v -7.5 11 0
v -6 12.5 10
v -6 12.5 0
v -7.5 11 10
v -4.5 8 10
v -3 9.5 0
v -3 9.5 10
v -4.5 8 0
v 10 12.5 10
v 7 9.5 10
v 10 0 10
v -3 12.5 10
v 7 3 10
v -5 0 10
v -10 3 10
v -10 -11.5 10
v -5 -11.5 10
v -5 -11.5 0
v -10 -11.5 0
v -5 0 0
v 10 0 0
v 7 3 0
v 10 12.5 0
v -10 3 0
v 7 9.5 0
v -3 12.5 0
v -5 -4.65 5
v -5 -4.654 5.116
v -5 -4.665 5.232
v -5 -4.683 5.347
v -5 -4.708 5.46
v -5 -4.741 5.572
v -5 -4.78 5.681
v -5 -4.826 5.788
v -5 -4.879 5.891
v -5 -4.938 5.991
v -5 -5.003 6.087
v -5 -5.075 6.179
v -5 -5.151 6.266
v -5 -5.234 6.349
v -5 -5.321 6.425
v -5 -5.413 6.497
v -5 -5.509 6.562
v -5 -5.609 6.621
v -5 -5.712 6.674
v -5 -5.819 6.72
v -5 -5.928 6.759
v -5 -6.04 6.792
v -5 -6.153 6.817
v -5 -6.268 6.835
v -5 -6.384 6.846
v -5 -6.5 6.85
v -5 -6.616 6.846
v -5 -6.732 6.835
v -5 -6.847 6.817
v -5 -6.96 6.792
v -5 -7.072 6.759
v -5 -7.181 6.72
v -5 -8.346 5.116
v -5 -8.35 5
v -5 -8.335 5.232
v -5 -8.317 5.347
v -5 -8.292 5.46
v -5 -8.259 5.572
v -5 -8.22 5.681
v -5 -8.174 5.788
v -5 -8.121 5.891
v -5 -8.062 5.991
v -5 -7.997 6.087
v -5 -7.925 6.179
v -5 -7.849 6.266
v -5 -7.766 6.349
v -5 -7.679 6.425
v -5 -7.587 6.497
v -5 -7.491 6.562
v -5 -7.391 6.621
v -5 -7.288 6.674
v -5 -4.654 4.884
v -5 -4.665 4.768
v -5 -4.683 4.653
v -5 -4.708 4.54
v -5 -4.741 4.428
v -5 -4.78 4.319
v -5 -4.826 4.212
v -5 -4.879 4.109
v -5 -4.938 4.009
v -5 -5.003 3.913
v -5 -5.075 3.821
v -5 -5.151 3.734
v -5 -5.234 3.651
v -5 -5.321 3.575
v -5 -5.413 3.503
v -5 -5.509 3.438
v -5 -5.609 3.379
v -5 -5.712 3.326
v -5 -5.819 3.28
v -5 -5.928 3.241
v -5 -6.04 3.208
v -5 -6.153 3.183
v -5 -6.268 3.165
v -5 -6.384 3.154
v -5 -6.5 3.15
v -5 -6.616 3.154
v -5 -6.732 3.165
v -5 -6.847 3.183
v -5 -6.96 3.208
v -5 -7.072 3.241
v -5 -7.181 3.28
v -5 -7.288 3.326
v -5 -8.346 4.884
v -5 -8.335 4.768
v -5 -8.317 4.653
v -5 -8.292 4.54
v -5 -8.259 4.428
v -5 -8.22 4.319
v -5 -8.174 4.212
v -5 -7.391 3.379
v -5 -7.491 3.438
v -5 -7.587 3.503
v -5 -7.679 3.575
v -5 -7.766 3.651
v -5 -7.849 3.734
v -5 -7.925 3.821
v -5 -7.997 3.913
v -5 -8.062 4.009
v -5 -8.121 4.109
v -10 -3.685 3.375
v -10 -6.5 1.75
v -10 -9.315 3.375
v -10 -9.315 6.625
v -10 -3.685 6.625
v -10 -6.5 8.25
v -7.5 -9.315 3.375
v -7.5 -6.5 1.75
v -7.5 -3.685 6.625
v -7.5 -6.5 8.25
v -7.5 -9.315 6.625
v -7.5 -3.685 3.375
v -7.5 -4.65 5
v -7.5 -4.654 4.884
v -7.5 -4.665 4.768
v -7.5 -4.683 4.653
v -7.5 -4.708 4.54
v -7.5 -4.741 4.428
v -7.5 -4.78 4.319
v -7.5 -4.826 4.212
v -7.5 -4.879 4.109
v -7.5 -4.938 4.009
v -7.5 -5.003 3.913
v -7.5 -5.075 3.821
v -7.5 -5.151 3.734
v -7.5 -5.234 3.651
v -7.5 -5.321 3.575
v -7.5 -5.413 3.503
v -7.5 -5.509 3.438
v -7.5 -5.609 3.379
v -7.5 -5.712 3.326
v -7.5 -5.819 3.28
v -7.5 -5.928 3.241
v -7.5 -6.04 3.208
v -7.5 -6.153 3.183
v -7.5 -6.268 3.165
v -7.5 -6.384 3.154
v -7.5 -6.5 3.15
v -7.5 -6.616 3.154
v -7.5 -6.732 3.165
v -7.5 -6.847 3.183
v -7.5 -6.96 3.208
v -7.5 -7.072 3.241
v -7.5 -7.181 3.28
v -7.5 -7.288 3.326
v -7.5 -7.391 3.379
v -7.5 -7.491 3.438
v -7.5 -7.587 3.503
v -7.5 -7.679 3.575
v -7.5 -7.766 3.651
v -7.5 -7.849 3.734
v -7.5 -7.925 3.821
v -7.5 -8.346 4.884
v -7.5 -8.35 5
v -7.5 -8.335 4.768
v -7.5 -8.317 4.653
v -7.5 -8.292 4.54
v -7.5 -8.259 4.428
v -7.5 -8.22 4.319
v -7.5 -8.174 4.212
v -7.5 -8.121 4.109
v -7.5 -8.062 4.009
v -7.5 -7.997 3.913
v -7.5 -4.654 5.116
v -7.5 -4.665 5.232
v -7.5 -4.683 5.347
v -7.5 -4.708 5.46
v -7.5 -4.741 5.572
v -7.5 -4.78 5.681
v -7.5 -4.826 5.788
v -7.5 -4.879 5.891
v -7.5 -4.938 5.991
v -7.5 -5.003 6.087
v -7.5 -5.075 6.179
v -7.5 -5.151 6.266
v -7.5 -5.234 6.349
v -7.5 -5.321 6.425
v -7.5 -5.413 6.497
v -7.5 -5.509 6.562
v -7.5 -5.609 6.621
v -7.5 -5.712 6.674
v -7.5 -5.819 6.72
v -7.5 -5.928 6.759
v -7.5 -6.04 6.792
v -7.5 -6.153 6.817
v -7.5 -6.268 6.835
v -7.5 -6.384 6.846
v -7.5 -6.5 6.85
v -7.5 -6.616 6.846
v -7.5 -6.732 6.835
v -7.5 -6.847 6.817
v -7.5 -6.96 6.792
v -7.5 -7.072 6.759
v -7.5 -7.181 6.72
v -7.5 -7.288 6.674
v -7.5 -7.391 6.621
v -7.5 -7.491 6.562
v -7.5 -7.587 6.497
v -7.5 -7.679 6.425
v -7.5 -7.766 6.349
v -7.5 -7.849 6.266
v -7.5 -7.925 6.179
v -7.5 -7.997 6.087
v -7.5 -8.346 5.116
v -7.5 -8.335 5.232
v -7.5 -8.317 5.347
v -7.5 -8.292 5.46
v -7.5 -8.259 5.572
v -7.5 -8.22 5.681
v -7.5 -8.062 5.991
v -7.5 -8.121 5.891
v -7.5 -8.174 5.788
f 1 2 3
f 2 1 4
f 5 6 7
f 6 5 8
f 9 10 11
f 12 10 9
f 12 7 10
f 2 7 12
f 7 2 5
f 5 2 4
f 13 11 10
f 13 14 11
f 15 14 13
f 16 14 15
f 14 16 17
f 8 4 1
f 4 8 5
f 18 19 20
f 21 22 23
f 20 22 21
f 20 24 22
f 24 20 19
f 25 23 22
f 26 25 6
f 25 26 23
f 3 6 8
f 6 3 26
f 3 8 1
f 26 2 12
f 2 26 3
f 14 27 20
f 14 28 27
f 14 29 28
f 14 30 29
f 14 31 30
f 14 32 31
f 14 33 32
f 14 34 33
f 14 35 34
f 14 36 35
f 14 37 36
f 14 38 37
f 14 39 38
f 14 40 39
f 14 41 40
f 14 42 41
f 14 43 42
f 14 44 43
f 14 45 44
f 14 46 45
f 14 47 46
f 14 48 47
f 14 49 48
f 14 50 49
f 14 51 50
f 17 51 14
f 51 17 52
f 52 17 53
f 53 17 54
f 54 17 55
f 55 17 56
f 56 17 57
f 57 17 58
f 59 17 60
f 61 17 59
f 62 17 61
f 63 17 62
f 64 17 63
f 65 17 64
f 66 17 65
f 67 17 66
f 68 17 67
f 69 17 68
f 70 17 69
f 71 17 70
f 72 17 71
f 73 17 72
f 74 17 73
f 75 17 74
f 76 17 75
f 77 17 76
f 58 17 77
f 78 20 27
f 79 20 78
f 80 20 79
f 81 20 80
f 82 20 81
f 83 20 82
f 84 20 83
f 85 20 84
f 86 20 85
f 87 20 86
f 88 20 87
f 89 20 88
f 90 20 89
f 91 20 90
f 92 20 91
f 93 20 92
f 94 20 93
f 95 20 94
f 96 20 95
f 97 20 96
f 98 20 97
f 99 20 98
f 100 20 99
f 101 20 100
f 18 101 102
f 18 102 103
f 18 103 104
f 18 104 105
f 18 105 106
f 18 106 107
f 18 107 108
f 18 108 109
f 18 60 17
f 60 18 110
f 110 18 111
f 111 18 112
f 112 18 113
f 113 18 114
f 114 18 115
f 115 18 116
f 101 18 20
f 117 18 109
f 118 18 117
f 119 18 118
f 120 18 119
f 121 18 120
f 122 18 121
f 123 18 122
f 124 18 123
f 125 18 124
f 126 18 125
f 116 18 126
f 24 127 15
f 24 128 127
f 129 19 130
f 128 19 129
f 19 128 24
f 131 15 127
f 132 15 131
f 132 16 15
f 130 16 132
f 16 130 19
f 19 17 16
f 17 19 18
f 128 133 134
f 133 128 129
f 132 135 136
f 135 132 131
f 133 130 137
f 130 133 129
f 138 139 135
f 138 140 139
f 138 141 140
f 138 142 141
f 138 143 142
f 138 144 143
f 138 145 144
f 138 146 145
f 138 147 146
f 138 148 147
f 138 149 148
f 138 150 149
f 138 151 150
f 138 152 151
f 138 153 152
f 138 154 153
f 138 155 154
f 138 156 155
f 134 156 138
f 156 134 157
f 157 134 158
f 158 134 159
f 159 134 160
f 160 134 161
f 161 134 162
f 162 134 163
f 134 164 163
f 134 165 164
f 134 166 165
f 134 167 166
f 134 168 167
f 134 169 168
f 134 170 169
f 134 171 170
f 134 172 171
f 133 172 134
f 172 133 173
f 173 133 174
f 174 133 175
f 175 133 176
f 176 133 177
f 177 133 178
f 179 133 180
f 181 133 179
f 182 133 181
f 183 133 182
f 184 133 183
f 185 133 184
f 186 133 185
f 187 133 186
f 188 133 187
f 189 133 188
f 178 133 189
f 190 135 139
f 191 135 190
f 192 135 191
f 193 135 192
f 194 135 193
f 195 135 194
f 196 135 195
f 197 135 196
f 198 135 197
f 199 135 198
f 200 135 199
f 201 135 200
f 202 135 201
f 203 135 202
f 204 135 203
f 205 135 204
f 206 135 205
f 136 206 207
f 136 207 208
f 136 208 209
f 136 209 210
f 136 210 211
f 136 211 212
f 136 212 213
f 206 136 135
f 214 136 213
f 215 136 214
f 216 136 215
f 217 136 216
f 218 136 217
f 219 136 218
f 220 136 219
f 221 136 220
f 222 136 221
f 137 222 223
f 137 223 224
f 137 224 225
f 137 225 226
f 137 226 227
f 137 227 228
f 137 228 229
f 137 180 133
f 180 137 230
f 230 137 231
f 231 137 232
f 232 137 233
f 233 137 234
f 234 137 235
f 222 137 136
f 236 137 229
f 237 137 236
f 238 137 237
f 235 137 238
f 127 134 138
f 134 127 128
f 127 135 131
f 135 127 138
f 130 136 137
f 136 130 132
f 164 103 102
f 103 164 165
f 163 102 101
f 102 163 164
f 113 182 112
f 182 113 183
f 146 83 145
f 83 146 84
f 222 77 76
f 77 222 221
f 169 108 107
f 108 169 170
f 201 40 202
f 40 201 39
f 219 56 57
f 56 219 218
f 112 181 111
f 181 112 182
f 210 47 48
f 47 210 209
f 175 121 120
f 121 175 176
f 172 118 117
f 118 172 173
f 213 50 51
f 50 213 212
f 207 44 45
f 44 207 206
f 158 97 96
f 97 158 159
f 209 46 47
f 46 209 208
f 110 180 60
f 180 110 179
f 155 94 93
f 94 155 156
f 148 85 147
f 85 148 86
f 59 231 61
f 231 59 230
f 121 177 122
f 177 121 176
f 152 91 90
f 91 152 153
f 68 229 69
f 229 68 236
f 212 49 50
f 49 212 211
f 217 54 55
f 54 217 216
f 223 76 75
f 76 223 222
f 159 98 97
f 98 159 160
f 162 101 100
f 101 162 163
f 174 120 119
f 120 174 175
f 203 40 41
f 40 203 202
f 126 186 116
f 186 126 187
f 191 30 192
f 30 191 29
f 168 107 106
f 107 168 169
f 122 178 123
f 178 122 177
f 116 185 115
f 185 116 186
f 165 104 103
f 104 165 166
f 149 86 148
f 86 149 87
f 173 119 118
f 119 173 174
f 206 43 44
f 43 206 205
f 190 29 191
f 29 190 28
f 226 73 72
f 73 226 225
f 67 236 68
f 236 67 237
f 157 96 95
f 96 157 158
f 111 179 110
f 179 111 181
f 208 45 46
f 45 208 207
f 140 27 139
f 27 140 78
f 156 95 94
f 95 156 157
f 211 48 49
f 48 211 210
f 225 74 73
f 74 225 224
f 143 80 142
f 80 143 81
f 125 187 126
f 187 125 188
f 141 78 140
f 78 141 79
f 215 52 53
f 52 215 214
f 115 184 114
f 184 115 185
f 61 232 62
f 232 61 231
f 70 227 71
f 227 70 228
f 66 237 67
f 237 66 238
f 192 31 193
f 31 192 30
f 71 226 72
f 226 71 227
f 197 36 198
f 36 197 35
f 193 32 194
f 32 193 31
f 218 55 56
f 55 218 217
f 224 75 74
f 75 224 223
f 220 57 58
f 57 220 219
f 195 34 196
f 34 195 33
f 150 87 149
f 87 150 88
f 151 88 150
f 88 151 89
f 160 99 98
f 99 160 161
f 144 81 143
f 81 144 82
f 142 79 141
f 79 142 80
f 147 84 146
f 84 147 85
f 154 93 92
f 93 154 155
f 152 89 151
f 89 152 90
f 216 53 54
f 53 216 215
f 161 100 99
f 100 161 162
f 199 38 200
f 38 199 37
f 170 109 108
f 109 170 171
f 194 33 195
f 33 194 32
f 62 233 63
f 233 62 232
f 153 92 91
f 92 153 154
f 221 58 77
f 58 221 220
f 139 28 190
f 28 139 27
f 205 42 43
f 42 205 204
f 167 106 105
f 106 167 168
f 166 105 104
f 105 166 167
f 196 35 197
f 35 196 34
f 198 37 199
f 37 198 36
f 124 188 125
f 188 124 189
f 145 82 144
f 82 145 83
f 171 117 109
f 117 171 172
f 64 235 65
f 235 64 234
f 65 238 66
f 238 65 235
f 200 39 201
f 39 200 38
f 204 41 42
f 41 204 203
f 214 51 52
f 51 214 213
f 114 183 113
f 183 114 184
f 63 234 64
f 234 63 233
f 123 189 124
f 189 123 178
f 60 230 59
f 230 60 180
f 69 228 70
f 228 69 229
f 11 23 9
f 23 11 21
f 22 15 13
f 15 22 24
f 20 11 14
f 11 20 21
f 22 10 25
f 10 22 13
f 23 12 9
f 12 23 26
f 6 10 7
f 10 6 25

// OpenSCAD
//---------------------------------------------------------------
//--  Eje Y final de carrera base.  (c) Antonio Castro Gómez
//---------------------------------------------------------------
//-- Released under the GPL license
//---------------------------------------------------------------





translate([0,1.5,5])cube(size=[20,3,10], center=true);//central
translate([8.5,7.75,5])cube(size=[3,9.5,10], center=true);//lado base
translate([2,11,5])cube(size=[10,3,10], center=true);//lado pestaña

//pestaña
difference()
{
	translate([-4.5,11,5])cylinder(h=10, r=3, $fn=4, center=true);
	translate([-4.5,14,5])cube(size=[3,3,10], center=true);

}
difference()
{
	translate([-7.5,-5.25,5])cube(size=[5,12.5,10], center=true);//tornillo
	translate([-9,-6.5,5])rotate([0,90,0])cylinder(h=3, r=3.25, $fn=6, center=true);//tuerca
	translate([-9,-6.5,5])rotate([0,90,0])cylinder(h=30, r=1.85, $fn=100, center=true);//tuerca

}

	
